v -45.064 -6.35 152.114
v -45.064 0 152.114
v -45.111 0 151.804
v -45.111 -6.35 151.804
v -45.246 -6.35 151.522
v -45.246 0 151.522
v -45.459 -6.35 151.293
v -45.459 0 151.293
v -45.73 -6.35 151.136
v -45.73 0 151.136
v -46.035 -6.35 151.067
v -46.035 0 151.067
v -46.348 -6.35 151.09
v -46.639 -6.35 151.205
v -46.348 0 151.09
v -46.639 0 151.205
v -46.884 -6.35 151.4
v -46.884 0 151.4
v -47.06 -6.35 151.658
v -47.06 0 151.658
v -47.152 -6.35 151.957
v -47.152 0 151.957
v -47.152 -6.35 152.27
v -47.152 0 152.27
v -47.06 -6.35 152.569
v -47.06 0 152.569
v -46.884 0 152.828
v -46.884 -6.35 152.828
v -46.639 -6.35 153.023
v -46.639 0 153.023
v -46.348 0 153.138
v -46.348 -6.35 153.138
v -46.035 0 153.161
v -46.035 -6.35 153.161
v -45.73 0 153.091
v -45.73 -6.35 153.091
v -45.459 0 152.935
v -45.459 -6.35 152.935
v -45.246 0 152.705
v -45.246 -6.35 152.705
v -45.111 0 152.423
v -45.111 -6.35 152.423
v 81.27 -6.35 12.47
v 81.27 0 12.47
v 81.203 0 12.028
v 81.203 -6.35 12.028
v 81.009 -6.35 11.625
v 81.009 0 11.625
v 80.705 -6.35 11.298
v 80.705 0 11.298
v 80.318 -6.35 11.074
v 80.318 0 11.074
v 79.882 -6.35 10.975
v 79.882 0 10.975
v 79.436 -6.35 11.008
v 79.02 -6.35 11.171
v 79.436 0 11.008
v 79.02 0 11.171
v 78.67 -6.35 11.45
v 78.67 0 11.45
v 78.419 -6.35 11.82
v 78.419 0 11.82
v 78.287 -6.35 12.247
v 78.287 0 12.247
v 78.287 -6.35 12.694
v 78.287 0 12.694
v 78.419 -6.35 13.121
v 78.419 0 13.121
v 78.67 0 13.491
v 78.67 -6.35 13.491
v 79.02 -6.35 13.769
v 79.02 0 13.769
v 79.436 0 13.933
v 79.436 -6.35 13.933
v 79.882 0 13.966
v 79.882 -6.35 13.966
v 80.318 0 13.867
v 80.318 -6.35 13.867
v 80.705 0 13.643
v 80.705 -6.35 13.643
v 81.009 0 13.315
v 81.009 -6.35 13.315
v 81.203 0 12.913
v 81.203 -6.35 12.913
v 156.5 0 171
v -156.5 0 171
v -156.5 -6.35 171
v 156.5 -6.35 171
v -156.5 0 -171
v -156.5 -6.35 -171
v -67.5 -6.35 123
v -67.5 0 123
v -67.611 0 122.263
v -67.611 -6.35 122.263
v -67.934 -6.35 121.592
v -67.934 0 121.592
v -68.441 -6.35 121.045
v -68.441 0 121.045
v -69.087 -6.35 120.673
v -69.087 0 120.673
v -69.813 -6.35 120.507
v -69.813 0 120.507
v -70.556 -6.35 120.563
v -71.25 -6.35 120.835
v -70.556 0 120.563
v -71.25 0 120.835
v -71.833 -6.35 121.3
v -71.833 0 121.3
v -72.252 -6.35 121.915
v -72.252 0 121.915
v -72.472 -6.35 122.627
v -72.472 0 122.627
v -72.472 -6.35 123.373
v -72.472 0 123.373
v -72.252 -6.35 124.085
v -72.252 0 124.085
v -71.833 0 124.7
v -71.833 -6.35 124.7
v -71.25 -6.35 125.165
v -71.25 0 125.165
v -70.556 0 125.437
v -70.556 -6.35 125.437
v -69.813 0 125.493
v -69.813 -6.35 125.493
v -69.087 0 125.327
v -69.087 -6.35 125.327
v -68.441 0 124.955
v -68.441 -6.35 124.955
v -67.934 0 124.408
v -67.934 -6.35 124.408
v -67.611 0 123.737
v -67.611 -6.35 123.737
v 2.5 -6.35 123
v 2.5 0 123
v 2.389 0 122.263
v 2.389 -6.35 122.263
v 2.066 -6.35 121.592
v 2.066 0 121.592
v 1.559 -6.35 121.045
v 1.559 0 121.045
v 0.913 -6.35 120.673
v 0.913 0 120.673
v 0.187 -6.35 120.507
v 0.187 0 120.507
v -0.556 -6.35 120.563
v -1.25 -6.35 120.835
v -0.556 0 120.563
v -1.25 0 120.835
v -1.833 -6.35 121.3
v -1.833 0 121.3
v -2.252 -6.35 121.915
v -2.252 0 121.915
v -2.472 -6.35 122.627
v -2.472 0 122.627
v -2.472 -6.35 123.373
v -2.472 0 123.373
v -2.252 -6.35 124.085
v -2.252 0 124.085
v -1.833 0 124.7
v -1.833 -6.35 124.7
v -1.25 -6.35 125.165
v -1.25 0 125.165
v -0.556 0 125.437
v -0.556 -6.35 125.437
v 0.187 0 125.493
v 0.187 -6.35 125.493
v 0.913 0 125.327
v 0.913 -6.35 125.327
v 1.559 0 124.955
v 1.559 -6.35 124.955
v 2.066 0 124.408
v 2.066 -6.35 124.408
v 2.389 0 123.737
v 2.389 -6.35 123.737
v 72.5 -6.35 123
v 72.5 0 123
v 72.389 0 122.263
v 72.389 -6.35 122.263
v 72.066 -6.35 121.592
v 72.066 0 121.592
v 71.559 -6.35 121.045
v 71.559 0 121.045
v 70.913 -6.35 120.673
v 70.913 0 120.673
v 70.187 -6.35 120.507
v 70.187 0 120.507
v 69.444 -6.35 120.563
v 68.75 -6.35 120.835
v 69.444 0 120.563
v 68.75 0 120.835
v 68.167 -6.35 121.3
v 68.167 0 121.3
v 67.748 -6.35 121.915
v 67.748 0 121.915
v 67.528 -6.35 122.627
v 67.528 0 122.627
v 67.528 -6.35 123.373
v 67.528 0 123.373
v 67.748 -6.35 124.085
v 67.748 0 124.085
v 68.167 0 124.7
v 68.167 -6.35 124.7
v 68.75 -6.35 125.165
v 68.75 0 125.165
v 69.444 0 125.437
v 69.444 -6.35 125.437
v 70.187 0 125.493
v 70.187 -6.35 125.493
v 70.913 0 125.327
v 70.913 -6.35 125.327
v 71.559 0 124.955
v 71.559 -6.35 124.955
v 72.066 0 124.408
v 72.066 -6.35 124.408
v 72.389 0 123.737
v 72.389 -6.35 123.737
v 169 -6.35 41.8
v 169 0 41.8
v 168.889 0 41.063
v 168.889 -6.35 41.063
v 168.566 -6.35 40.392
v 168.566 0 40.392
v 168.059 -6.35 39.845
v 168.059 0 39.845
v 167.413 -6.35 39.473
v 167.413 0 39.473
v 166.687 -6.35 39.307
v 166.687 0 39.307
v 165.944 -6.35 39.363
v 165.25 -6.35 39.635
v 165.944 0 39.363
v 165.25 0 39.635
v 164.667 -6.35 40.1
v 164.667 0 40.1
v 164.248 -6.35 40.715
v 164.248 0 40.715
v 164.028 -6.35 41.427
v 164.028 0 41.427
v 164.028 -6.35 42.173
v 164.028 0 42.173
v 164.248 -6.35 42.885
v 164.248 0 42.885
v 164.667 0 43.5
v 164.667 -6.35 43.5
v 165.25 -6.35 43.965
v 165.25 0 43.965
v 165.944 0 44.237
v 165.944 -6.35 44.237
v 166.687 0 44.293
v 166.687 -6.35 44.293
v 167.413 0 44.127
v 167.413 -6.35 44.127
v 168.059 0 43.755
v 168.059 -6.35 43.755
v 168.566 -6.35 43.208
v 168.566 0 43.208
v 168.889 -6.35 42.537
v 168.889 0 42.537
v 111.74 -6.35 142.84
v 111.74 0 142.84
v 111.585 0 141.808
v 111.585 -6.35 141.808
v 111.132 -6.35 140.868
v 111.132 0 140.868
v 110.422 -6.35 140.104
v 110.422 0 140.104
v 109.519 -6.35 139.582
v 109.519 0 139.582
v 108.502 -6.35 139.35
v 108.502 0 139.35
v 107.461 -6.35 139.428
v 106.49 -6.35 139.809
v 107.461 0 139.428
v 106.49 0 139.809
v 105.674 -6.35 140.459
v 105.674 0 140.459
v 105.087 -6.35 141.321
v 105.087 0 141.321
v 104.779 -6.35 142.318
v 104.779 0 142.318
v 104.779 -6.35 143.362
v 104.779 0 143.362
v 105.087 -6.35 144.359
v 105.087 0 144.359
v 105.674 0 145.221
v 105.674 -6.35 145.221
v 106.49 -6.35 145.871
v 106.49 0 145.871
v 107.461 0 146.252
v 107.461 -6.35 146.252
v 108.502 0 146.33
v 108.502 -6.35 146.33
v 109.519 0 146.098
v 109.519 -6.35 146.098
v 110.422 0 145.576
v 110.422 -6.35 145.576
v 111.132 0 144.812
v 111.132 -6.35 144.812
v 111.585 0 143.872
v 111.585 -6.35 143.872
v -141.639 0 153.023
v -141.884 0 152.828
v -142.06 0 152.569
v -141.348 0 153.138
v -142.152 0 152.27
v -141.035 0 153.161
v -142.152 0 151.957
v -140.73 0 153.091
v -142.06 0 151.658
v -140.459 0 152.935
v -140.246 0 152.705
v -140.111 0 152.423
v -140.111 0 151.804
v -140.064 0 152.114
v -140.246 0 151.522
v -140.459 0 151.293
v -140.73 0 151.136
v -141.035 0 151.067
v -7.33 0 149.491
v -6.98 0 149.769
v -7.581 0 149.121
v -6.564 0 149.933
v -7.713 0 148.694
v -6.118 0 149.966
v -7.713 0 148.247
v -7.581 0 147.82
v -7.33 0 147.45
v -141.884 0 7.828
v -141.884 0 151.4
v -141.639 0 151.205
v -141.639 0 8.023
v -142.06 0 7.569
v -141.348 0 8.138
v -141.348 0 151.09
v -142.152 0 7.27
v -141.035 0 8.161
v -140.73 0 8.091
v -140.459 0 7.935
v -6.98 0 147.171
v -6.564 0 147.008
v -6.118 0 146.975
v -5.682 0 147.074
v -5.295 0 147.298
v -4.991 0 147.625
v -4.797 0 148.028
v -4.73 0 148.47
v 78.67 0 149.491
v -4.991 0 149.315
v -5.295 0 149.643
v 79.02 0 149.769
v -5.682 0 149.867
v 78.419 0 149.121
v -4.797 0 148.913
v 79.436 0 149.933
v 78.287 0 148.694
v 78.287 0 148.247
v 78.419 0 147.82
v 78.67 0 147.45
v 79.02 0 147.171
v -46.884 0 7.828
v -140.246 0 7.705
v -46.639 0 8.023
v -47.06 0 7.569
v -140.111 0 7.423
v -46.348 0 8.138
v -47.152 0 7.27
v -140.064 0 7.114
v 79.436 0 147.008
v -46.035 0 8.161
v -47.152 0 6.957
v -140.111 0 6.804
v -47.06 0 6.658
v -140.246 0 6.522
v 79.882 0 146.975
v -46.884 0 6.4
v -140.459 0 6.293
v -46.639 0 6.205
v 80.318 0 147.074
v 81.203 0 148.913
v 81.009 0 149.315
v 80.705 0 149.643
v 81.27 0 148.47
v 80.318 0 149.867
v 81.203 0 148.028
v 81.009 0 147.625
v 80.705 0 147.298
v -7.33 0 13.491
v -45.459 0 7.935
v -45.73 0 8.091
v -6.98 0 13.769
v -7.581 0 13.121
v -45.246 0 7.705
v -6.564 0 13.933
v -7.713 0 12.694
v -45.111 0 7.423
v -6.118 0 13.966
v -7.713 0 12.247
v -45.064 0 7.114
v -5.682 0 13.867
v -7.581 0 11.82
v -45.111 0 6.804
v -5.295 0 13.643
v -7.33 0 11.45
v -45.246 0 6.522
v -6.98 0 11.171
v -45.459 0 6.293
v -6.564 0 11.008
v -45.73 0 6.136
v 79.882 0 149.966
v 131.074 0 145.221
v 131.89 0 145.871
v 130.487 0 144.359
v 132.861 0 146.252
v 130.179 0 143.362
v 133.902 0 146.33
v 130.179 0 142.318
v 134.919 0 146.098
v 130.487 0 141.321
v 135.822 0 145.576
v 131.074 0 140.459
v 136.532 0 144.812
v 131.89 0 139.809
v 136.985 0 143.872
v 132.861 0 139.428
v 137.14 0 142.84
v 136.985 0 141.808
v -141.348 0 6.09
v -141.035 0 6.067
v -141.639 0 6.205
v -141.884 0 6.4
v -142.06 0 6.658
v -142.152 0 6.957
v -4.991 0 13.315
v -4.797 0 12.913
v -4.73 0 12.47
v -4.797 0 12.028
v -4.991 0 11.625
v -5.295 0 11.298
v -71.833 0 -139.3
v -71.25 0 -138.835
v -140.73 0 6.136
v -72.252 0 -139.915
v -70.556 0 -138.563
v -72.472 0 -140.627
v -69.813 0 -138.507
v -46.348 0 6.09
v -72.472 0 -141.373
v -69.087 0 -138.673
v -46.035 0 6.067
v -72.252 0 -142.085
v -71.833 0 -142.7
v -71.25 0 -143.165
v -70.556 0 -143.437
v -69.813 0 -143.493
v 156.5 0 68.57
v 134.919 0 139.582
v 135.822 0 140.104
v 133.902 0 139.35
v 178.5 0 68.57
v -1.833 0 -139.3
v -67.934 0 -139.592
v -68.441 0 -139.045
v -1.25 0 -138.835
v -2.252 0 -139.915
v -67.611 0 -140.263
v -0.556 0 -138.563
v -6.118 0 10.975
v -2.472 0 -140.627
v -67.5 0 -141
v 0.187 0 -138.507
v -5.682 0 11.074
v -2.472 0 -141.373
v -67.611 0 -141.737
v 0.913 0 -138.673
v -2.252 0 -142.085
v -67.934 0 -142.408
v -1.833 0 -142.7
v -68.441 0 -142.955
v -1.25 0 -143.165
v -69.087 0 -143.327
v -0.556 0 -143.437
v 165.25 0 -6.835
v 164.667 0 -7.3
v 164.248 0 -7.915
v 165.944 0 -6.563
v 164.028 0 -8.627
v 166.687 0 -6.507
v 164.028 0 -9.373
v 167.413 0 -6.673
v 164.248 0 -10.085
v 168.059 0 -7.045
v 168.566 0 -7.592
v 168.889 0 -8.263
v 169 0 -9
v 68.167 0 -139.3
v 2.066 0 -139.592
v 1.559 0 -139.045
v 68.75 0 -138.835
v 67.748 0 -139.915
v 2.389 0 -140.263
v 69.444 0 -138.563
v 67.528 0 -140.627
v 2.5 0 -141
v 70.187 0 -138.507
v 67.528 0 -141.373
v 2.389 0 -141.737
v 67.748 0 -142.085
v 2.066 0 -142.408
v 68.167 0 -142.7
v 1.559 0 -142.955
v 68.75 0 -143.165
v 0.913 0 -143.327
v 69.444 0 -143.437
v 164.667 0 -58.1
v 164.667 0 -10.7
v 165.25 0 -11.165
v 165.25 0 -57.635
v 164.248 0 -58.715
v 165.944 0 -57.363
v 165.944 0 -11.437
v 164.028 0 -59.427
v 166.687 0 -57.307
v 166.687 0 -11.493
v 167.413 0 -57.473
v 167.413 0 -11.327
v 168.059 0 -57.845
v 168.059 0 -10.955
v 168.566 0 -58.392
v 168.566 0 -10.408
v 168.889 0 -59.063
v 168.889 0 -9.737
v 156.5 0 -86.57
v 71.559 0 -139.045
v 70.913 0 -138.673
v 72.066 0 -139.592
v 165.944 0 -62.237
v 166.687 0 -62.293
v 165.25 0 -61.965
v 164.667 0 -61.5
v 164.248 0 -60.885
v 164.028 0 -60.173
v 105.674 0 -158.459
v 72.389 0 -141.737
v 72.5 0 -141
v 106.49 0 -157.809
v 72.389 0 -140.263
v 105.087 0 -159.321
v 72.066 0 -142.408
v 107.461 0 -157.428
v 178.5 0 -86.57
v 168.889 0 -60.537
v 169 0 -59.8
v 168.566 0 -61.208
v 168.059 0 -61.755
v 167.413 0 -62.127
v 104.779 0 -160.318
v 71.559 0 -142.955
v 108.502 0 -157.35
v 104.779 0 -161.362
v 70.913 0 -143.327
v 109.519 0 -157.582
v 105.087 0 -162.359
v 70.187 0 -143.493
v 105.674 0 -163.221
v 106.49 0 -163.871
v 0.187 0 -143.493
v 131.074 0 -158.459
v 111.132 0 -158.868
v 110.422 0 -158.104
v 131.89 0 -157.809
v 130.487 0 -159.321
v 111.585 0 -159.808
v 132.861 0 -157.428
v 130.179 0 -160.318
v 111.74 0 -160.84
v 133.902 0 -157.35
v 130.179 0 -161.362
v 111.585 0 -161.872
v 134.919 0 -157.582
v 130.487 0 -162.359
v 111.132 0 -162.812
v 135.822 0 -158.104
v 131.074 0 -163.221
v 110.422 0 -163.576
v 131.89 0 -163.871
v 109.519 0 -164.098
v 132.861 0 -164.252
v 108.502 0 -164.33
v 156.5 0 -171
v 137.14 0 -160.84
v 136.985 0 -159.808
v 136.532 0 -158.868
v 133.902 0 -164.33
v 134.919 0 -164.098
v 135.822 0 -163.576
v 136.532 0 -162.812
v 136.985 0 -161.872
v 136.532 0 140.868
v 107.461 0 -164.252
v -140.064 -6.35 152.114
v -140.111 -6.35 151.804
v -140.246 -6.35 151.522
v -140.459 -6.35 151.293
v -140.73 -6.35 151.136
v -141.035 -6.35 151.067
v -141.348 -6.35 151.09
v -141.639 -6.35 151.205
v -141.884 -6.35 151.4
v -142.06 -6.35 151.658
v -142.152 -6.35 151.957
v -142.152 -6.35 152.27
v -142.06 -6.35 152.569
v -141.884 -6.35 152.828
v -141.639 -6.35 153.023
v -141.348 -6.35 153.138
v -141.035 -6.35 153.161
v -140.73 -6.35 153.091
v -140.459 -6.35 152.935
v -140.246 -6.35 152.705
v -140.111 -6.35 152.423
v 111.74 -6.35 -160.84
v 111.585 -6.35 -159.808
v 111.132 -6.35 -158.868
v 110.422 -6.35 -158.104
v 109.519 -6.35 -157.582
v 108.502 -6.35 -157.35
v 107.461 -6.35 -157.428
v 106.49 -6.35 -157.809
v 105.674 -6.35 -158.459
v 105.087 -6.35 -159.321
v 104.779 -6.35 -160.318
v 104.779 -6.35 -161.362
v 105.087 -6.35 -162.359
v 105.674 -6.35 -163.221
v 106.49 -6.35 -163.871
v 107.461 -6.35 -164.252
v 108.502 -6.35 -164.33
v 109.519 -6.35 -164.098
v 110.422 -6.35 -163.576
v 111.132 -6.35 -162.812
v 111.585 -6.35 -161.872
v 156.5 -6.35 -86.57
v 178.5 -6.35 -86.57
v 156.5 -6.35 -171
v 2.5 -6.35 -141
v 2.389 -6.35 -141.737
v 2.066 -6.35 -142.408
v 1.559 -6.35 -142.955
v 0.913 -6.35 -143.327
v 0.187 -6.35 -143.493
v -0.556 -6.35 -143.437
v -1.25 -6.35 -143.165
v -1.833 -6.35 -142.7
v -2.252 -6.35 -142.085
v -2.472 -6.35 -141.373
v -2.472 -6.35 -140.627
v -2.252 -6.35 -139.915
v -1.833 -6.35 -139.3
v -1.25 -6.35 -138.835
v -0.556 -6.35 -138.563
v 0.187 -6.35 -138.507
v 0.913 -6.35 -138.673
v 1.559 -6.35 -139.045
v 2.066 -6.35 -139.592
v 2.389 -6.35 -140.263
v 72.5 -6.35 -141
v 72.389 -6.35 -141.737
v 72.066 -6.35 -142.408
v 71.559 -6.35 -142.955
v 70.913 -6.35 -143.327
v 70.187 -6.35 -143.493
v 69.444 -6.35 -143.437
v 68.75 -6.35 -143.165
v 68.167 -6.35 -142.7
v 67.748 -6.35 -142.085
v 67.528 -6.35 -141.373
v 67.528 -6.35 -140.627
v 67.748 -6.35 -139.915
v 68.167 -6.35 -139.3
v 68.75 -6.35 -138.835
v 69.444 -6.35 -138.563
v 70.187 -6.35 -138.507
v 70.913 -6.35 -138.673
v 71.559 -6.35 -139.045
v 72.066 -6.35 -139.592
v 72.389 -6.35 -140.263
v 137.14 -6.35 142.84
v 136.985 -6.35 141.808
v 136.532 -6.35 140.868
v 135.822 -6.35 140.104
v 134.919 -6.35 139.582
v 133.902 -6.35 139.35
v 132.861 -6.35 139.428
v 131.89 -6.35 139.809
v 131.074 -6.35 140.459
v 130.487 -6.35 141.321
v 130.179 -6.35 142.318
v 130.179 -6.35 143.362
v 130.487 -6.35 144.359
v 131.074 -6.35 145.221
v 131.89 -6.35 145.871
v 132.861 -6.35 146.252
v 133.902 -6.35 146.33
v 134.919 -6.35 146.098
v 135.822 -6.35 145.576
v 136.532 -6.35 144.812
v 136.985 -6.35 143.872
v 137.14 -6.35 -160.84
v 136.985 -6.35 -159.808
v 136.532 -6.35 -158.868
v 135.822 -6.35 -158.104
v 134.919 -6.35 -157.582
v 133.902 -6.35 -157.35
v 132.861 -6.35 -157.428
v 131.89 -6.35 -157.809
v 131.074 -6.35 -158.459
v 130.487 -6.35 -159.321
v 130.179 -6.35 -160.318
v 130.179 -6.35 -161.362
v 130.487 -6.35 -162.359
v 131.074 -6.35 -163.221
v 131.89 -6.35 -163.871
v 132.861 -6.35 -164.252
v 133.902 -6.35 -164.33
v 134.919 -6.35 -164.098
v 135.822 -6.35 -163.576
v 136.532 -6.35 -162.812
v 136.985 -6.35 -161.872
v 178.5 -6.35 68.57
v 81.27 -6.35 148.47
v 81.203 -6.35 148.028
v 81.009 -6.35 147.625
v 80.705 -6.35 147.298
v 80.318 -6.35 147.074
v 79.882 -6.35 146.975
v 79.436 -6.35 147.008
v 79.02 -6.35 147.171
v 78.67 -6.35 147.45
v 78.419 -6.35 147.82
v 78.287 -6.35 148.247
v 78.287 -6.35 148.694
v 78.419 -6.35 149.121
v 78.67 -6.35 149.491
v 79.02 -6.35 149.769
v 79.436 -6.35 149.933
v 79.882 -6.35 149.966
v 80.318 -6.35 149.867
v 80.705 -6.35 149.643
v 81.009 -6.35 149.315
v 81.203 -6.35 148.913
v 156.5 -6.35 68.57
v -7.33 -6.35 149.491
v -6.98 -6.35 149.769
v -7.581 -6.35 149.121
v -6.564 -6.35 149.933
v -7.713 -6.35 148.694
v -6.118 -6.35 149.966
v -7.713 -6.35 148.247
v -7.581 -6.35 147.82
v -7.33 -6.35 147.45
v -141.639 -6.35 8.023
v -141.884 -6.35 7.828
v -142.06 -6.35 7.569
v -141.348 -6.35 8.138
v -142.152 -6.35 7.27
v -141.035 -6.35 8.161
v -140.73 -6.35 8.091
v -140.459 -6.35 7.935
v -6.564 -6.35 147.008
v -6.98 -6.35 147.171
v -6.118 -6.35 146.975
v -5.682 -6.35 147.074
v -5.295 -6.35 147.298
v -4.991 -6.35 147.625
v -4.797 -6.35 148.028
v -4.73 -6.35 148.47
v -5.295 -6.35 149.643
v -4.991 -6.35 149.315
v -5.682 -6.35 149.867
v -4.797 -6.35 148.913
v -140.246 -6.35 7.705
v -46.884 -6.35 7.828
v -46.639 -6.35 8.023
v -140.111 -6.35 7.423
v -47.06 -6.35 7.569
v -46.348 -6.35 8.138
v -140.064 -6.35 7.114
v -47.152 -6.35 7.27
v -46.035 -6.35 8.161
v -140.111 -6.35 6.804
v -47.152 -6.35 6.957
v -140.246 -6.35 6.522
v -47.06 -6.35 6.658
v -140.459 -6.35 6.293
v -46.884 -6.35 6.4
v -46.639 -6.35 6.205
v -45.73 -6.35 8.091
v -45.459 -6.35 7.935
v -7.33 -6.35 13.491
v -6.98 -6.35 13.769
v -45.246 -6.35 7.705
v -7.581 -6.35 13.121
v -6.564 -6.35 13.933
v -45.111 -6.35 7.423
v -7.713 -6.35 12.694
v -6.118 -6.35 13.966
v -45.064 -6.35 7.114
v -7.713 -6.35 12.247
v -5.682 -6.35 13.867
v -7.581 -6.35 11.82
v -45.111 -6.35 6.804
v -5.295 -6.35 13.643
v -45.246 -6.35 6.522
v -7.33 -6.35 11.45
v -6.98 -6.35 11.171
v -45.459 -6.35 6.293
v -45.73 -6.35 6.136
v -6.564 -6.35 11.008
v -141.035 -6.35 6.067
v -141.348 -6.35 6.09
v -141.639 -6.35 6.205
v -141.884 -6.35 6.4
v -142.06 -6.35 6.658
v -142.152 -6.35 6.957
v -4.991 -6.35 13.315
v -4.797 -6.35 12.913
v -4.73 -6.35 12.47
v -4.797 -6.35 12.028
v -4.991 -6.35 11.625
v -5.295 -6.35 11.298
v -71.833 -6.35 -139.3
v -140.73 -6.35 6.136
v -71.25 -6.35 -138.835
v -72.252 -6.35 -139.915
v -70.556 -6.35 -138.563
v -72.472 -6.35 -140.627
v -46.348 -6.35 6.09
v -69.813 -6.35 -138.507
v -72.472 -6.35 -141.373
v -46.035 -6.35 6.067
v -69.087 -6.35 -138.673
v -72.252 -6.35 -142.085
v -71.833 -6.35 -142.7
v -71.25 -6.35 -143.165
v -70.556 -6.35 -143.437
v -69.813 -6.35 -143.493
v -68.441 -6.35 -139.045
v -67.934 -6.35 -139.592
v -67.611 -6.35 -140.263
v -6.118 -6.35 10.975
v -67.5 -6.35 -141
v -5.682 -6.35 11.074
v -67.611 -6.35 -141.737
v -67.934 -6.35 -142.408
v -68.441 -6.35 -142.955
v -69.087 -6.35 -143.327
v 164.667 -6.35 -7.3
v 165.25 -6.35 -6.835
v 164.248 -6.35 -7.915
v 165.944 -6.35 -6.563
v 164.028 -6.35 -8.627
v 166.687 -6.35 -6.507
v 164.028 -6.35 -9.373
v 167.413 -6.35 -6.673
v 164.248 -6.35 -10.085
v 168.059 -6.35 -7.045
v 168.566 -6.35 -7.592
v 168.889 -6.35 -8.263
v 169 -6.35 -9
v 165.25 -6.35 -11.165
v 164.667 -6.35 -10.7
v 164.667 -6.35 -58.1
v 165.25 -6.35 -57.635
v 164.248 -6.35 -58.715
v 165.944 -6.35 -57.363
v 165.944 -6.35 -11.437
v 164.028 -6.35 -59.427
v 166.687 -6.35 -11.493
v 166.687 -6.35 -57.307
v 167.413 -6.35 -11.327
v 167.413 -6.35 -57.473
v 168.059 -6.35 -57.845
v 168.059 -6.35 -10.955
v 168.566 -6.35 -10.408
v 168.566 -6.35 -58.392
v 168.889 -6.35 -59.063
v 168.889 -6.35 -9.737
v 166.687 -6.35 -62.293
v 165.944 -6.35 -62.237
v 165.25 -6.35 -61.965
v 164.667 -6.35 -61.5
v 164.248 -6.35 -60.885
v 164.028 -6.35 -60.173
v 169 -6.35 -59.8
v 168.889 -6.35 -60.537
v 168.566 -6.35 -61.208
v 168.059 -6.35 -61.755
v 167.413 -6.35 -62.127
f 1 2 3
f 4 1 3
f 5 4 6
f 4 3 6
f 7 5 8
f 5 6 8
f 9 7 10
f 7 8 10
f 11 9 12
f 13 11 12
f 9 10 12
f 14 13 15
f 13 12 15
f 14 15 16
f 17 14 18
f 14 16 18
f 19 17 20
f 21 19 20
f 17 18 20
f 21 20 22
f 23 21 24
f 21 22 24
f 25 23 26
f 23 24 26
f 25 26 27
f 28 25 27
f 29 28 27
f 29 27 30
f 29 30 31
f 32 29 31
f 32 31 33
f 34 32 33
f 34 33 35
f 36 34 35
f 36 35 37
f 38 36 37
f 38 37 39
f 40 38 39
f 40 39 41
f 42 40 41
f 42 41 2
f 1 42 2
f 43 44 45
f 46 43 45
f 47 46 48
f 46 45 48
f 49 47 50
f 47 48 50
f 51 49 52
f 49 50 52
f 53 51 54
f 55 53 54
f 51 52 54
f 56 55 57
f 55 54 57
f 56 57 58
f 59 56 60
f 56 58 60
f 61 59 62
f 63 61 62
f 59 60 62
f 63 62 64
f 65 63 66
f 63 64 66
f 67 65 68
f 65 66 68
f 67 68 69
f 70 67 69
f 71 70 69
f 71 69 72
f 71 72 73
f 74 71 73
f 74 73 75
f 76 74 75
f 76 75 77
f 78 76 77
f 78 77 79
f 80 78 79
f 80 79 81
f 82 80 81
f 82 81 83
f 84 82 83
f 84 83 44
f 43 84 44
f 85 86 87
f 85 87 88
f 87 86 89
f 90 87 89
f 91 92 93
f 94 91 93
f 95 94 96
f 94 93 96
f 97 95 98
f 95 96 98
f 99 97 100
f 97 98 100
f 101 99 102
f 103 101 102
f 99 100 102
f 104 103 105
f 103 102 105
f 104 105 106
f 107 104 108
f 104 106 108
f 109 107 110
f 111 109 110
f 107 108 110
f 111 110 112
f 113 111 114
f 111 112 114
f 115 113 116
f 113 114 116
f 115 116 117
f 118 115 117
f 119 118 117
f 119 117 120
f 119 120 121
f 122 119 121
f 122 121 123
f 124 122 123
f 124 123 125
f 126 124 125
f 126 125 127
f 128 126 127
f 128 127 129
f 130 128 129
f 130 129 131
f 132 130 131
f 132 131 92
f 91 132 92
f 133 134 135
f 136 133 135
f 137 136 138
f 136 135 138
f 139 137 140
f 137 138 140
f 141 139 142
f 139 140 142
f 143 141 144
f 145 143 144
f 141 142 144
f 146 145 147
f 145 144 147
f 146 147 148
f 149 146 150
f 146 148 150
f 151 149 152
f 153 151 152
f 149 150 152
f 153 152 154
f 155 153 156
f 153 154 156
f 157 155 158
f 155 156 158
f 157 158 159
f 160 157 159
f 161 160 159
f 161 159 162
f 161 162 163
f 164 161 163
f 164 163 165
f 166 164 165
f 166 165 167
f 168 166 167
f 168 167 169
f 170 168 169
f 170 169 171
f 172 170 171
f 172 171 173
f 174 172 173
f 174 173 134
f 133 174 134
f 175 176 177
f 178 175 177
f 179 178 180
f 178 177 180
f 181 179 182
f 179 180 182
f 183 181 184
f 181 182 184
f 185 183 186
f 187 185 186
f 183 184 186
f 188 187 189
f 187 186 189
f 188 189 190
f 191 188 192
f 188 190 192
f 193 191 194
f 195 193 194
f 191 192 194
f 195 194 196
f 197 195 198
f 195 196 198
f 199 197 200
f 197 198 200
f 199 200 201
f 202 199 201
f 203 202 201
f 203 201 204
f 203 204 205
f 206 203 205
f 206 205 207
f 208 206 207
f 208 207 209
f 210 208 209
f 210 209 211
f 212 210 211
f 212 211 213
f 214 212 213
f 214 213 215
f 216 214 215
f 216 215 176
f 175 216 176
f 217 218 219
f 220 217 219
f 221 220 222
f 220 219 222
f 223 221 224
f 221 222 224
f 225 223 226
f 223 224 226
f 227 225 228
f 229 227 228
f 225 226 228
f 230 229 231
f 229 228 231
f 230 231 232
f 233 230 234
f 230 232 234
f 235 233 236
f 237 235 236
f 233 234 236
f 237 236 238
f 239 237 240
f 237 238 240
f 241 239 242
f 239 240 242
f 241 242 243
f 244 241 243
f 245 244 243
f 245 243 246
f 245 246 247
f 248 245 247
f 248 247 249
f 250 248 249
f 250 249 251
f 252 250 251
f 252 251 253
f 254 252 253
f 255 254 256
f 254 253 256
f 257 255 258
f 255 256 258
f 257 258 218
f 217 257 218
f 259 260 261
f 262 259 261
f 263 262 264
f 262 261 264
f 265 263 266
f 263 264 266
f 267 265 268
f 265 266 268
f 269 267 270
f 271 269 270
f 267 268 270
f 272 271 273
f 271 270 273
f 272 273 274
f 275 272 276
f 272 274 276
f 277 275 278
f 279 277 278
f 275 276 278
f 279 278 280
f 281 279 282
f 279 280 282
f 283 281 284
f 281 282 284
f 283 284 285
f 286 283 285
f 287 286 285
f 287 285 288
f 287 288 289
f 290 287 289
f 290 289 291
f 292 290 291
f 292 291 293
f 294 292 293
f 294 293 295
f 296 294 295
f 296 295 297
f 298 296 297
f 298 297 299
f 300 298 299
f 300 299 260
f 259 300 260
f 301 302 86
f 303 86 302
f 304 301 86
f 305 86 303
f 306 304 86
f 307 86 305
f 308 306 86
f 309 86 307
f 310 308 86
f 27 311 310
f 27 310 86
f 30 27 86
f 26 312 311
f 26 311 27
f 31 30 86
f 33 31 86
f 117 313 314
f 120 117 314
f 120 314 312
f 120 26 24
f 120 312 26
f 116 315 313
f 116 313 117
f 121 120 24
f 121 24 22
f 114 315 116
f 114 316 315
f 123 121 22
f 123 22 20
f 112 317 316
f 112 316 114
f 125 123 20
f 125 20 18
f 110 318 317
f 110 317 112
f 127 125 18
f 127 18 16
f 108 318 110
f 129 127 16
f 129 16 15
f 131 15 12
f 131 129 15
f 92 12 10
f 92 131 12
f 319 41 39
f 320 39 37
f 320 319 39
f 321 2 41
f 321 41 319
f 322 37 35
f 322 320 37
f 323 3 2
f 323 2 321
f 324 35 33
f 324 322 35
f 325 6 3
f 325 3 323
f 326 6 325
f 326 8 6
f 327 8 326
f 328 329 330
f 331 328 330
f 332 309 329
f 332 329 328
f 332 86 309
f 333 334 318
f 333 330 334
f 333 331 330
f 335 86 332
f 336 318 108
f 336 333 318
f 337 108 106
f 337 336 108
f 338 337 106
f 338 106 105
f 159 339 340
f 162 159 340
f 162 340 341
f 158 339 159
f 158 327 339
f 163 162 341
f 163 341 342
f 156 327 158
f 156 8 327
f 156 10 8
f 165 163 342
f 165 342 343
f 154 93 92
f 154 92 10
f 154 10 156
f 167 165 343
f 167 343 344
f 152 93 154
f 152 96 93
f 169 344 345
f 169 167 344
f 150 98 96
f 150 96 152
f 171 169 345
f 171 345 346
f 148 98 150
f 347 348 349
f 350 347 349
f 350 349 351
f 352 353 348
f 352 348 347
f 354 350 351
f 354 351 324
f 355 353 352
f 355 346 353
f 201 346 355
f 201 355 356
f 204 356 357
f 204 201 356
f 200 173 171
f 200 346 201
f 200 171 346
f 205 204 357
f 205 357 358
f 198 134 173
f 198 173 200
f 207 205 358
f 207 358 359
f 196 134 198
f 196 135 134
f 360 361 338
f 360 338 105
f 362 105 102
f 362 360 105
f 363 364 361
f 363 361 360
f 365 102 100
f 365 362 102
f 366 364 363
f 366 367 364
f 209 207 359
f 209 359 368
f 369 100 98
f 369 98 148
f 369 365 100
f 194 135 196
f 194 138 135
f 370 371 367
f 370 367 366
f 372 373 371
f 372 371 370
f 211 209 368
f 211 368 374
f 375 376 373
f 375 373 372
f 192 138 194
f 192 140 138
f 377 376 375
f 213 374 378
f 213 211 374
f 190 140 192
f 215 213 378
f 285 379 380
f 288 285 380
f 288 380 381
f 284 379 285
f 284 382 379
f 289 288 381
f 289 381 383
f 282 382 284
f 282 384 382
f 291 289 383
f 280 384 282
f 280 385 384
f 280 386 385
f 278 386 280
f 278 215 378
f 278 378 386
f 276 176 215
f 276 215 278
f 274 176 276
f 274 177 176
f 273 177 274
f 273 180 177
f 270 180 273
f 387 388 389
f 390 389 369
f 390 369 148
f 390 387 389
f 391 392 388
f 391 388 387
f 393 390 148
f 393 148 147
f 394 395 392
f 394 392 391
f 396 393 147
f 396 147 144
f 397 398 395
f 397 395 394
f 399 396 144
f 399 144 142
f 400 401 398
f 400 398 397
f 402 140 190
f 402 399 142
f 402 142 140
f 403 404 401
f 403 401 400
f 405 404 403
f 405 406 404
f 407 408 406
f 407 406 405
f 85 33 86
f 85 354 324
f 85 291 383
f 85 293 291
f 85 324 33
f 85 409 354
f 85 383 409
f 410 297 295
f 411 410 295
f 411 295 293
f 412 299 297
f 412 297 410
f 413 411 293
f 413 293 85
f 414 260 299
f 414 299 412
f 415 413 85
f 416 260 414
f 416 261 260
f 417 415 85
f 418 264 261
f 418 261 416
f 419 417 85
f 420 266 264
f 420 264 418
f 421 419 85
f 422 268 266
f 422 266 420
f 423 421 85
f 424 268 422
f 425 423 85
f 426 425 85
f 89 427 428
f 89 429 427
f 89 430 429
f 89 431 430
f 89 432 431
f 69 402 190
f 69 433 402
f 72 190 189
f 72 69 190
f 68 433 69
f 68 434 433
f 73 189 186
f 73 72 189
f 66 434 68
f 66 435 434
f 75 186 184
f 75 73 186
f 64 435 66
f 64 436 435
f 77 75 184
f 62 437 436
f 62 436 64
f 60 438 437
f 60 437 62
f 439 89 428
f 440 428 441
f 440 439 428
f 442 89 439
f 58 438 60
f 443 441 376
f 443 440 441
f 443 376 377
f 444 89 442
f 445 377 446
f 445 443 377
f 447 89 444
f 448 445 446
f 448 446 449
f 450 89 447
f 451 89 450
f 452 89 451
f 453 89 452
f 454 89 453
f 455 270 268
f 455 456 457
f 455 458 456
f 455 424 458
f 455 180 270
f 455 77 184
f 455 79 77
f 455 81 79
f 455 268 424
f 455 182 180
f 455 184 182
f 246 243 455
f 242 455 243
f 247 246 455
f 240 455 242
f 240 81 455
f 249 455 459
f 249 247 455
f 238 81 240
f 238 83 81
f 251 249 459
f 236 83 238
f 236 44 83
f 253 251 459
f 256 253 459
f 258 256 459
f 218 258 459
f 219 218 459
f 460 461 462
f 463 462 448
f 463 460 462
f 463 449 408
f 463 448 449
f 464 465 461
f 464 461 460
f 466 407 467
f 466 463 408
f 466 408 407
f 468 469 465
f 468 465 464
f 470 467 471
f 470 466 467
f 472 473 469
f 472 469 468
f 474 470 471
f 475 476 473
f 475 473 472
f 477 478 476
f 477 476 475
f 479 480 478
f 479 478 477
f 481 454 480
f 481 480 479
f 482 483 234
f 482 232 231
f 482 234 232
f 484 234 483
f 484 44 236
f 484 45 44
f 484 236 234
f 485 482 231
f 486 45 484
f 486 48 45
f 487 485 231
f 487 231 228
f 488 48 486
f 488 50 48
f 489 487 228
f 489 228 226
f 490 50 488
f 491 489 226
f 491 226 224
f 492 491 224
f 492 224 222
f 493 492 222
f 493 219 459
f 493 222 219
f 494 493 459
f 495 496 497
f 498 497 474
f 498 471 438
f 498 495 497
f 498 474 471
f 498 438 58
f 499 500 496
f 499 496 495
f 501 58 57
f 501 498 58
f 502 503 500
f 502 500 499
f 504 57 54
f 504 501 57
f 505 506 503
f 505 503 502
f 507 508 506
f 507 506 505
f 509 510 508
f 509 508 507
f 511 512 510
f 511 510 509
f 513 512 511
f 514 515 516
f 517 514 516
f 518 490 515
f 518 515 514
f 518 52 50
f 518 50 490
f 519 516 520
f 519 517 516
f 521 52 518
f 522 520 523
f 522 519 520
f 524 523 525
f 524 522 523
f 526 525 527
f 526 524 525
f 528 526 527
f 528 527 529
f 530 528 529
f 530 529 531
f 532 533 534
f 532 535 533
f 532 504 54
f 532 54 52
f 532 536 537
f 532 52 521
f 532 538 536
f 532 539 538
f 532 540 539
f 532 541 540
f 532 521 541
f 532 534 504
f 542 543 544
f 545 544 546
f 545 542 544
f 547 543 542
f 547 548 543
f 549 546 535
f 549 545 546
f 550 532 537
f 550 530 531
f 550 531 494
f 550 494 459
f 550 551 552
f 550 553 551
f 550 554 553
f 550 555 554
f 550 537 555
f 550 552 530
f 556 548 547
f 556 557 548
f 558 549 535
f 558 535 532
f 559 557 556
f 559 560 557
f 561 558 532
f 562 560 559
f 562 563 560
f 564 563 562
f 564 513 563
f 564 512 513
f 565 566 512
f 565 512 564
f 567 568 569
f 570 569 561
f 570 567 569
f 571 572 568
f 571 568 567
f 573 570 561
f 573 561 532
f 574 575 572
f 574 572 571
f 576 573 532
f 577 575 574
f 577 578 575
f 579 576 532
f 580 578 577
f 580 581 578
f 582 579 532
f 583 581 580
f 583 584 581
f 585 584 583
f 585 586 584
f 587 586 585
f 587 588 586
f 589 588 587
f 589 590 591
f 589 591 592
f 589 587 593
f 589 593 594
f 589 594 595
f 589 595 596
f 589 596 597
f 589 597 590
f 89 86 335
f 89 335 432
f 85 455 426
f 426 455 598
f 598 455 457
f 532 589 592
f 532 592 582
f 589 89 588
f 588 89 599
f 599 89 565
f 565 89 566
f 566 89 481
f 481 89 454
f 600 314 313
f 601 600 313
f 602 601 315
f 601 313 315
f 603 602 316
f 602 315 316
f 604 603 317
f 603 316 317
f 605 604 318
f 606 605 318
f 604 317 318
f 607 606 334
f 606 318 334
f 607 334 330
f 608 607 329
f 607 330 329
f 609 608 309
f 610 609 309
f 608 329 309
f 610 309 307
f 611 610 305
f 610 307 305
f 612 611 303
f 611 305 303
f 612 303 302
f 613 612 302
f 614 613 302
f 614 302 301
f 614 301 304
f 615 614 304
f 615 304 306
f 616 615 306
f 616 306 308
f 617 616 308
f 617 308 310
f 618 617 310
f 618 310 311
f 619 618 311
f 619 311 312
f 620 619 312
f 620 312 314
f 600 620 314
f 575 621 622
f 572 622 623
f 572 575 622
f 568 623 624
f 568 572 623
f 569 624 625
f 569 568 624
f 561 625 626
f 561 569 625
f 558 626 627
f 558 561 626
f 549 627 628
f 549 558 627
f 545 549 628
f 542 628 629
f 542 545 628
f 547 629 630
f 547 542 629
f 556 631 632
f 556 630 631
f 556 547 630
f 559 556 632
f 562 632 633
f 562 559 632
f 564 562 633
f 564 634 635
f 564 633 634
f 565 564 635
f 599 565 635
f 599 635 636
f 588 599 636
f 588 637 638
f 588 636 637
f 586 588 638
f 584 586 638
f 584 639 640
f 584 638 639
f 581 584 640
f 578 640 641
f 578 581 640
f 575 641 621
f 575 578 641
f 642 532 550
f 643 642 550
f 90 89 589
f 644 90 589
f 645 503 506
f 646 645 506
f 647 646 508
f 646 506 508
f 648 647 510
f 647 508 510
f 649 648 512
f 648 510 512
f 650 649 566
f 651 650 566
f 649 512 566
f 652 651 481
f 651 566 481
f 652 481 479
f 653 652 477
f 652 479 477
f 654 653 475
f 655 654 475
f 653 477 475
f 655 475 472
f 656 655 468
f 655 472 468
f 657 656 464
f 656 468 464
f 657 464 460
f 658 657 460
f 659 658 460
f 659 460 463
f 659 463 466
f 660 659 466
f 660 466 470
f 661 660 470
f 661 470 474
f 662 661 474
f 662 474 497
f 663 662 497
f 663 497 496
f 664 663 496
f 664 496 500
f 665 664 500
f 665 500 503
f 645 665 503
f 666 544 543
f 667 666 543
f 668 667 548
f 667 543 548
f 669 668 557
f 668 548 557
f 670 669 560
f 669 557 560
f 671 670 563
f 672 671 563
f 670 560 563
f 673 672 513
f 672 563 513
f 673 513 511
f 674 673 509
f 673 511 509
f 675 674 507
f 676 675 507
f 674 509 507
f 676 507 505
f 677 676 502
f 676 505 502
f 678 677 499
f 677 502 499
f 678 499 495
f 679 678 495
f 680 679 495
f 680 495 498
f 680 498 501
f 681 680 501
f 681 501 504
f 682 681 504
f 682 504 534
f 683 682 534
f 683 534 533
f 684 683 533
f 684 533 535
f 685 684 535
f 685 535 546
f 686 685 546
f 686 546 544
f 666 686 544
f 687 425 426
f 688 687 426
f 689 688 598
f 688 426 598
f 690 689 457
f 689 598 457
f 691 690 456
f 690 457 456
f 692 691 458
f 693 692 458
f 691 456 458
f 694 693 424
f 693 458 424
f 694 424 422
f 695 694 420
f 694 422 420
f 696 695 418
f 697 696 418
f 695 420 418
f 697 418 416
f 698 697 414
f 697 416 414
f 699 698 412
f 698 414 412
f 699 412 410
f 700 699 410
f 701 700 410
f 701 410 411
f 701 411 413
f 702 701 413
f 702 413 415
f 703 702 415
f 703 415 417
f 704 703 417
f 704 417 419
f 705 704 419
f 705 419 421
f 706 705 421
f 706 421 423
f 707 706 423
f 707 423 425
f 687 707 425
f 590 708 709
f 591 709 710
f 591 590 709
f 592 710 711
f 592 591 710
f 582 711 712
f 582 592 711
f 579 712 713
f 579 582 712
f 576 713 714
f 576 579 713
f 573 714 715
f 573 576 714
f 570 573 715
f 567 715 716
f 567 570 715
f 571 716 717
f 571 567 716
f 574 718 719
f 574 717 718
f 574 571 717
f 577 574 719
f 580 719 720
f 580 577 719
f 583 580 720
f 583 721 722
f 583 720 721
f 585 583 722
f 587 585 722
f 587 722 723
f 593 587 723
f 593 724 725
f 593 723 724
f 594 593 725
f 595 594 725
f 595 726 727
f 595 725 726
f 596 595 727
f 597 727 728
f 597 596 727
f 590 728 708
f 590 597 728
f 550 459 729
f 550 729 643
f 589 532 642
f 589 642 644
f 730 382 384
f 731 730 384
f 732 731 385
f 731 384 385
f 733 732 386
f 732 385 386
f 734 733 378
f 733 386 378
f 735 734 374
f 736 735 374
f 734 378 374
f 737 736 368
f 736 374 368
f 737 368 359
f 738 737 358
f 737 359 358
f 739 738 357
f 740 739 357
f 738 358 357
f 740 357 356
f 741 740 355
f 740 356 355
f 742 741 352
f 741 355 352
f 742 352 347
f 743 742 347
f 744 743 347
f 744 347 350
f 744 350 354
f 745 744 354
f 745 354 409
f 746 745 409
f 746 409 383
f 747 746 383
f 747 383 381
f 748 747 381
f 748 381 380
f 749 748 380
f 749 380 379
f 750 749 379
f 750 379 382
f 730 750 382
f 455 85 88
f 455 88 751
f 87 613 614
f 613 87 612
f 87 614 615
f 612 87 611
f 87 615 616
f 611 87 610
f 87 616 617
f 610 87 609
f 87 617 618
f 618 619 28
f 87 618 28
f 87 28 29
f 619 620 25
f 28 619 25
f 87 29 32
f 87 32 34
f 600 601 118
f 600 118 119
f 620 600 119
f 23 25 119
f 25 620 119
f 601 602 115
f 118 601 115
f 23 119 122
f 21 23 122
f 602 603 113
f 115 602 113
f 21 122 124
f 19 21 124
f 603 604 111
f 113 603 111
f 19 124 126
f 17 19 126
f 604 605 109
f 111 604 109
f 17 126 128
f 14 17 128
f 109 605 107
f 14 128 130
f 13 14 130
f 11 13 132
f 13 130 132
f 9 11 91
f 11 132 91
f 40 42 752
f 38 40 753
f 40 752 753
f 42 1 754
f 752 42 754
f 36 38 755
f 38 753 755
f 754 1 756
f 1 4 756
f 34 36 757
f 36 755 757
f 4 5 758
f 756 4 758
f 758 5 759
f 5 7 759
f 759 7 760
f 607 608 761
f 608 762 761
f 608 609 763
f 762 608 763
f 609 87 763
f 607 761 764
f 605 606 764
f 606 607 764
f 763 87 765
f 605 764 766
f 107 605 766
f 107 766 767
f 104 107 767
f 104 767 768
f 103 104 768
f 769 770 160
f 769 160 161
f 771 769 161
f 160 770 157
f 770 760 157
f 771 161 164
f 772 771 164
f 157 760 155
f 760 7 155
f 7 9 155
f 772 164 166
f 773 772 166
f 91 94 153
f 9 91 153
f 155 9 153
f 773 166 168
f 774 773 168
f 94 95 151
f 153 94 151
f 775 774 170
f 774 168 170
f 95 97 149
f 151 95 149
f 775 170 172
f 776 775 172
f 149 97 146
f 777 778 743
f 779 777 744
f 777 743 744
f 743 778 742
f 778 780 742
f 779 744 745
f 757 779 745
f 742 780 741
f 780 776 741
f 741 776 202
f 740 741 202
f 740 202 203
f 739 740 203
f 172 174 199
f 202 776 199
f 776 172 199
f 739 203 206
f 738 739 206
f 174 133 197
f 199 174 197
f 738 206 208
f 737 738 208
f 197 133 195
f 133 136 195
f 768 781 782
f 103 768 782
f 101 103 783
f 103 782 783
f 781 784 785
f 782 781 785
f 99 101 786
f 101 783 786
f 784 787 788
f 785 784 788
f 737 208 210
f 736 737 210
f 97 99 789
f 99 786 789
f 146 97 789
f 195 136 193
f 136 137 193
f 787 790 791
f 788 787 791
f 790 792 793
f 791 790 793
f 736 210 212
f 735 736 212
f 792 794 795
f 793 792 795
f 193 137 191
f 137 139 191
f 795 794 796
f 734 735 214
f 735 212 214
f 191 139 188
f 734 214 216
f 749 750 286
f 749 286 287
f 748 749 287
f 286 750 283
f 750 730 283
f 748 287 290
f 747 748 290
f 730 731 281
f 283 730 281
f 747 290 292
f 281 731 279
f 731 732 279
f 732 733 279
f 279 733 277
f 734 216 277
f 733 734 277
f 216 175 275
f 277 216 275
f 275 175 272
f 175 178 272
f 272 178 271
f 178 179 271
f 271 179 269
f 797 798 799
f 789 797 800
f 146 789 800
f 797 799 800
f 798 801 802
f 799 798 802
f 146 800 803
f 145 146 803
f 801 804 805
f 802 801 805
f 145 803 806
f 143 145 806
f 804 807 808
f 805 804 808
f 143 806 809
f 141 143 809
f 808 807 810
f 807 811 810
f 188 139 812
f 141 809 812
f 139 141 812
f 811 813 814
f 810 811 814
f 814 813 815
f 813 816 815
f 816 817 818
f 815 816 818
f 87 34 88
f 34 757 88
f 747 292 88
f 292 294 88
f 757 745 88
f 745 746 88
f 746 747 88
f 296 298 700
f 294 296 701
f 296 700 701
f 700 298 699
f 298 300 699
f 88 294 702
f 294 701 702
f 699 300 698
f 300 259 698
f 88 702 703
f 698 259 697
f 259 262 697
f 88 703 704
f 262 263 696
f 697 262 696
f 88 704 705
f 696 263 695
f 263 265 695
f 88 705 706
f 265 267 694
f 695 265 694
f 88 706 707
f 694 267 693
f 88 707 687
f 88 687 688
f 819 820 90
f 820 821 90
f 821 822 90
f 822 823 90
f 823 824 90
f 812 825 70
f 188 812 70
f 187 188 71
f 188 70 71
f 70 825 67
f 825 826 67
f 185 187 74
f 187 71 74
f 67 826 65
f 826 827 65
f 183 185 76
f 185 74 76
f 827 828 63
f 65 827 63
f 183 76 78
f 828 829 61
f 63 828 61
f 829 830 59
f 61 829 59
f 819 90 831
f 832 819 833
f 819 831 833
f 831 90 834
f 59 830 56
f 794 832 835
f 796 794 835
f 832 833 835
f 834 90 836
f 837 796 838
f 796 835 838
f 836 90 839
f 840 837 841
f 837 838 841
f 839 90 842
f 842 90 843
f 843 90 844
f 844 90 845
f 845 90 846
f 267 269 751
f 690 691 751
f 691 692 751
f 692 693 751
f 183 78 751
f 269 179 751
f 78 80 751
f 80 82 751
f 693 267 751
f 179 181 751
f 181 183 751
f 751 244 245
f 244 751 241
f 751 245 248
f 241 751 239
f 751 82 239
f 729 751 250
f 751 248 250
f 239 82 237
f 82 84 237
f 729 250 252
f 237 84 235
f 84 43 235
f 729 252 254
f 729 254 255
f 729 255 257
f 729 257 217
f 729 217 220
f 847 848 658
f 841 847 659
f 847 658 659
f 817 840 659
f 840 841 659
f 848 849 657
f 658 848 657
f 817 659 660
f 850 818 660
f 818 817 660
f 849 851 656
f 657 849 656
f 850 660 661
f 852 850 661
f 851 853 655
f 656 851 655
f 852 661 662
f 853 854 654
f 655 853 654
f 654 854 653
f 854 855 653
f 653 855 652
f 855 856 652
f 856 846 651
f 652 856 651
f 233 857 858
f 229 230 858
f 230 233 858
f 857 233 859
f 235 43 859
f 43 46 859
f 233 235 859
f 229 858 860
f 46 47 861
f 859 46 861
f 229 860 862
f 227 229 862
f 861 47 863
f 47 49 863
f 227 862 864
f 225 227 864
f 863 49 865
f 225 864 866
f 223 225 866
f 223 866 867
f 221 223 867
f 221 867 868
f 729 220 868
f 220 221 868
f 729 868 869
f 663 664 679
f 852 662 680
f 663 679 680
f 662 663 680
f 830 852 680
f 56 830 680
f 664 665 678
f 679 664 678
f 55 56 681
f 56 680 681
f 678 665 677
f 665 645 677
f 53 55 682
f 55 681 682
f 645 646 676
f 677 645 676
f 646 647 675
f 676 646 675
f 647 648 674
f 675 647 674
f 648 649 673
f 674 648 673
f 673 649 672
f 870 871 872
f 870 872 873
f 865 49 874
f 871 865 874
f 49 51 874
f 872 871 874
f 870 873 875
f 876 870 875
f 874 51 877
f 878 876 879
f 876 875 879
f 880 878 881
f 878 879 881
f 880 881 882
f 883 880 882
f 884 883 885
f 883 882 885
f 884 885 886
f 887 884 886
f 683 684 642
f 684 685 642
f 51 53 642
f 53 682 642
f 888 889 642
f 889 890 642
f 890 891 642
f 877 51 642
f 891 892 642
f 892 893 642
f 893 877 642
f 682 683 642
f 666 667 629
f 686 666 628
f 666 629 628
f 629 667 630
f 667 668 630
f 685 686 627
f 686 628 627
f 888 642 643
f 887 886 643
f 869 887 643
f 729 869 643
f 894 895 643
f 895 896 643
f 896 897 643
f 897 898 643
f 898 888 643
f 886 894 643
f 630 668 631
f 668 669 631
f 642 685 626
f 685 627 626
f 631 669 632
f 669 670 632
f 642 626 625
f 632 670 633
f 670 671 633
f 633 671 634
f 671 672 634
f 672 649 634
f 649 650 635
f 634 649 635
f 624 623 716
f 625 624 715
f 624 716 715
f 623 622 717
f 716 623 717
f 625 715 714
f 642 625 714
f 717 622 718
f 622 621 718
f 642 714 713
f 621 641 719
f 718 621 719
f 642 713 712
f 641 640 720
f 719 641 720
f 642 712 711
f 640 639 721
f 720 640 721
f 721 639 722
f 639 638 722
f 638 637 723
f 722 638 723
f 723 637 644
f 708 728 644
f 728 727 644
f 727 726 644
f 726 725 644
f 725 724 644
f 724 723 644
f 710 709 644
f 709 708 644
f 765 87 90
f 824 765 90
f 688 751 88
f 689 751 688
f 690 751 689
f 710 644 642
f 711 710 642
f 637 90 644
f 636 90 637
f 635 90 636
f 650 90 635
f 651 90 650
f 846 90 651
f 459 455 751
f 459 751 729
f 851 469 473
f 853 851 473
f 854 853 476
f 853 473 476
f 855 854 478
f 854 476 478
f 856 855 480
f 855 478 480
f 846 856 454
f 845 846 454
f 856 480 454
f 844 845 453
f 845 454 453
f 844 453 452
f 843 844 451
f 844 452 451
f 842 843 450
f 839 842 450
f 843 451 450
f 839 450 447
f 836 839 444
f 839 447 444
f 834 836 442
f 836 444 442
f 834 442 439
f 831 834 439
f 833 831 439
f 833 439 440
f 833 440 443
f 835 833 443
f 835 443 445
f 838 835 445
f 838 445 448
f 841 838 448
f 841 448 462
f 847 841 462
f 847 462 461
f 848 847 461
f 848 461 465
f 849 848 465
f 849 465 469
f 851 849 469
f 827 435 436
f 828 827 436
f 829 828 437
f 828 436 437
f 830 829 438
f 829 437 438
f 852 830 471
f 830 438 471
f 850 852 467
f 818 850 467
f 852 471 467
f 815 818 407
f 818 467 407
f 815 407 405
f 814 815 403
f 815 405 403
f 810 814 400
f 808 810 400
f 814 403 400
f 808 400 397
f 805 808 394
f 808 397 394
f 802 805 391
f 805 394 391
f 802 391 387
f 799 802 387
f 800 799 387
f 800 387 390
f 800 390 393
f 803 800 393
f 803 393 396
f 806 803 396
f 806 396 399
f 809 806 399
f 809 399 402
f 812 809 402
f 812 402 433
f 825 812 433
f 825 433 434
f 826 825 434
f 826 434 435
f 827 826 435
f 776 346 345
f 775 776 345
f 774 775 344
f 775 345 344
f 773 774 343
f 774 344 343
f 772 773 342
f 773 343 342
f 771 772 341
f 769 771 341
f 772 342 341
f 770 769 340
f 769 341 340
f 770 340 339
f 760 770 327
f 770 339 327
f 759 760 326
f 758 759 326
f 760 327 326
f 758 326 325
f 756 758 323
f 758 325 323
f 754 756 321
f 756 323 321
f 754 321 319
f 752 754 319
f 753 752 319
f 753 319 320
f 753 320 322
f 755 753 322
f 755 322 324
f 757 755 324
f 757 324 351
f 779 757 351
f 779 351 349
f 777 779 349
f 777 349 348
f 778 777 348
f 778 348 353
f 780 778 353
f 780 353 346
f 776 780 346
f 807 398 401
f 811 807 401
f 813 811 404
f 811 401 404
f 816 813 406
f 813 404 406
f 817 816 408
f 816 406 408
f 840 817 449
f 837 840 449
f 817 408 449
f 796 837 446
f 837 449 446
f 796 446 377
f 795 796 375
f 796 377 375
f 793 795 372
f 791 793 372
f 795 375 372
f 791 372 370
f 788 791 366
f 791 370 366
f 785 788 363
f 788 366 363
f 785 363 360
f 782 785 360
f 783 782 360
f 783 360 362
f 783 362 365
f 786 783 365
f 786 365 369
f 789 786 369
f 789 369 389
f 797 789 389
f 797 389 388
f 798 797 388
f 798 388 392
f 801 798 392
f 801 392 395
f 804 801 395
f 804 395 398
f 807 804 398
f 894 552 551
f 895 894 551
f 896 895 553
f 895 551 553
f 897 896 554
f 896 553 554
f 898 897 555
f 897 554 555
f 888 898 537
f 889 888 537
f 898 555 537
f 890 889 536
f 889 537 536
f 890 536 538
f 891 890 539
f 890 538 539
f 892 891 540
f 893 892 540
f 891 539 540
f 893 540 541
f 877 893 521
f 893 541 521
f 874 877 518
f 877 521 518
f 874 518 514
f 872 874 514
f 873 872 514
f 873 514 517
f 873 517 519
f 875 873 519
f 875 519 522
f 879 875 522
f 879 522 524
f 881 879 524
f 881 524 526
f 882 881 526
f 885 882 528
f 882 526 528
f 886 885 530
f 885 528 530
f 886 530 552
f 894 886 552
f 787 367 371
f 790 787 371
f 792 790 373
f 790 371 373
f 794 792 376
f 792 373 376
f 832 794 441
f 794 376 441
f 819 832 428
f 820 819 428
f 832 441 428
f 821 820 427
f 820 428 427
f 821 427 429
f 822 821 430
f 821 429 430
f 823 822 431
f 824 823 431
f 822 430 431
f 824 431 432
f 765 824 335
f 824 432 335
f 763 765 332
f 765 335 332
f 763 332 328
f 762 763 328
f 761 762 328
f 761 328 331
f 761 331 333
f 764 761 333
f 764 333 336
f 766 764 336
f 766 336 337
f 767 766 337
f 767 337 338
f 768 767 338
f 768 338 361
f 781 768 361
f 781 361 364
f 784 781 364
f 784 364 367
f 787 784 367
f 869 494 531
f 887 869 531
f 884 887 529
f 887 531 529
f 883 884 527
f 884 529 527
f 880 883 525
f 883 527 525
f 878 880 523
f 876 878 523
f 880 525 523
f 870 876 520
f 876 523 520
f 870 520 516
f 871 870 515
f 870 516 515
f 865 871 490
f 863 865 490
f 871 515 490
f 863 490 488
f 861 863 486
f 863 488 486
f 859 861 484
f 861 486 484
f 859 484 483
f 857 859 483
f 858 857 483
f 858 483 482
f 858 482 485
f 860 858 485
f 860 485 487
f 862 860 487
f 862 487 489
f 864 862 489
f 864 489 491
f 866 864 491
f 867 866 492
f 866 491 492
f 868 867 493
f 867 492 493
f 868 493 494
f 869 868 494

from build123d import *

# Parameters (mm, degrees)
SKETCH1_W           = 313
SKETCH1_H           = 342
BOSS_EXTRUDE1_DEPTH = 6.35
SKETCH3_W           = 22
SKETCH3_H           = 155.14040353
SKETCH3_R           = 2.5
BOSS_EXTRUDE2_DEPTH = 6.35
SKETCH2_R           = 2.5
CUT_EXTRUDE1_DEPTH  = 7.35
SKETCH4_R           = 3.5
CUT_EXTRUDE2_DEPTH  = 7.35
SKETCH5_R           = 1.5
SKETCH5_R_2         = 1.05
CUT_EXTRUDE3_DEPTH  = 7.35


with BuildPart() as part:
    # Sketch1 → Boss-Extrude1 (new body)
    with BuildSketch(Plane(origin=(0, 0, 0), x_dir=(1, 0, 0), z_dir=(0, 1, 0))):
        Rectangle(SKETCH1_W, SKETCH1_H)
    extrude(amount=-BOSS_EXTRUDE1_DEPTH)

    # Sketch3 → Boss-Extrude2 (add)
    with BuildSketch(Plane(origin=(0, 0, 0), x_dir=(1, 0, 0), z_dir=(0, 1, 0))):
        with Locations((167.5, 9)):
            Rectangle(SKETCH3_W, SKETCH3_H)
        with Locations((166.5, 9)):
            Circle(SKETCH3_R, mode=Mode.SUBTRACT)
        with Locations((166.5, -41.8)):
            Circle(SKETCH3_R, mode=Mode.SUBTRACT)
        with Locations((166.5, 59.8)):
            Circle(SKETCH3_R, mode=Mode.SUBTRACT)
    extrude(amount=-BOSS_EXTRUDE2_DEPTH)

    # Sketch2 → Cut-Extrude1 (cut, through all)
    with BuildSketch(Plane(origin=(0, 0, 0), x_dir=(1, 0, 0), z_dir=(0, 1, 0))):
        with Locations((0, -123)):
            Circle(SKETCH2_R)
        with Locations((-70, -123)):
            Circle(SKETCH2_R)
        with Locations((70, -123)):
            Circle(SKETCH2_R)
        with Locations((-70, 141)):
            Circle(SKETCH2_R)
        with Locations((0, 141)):
            Circle(SKETCH2_R)
        with Locations((70, 141)):
            Circle(SKETCH2_R)
    extrude(amount=-CUT_EXTRUDE1_DEPTH, mode=Mode.SUBTRACT)

    # Sketch4 → Cut-Extrude2 (cut, through all)
    with BuildSketch(Plane(origin=(0, 0, 0), x_dir=(1, 0, 0), z_dir=(0, 1, 0))):
        with Locations((133.64, -142.84)):
            Circle(SKETCH4_R)
        with Locations((108.24, -142.84)):
            Circle(SKETCH4_R)
    cut_extrude2 = extrude(amount=-CUT_EXTRUDE2_DEPTH, mode=Mode.SUBTRACT)

    # Mirror1: Cut-Extrude2 across plane
    add(cut_extrude2.mirror(Plane(origin=(0, 0, -9), x_dir=(1, 0, 0), z_dir=(0, 0, -1))), mode=Mode.SUBTRACT)

    # Sketch5 → Cut-Extrude3 (cut, through all)
    with BuildSketch(Plane(origin=(0, 0, 0), x_dir=(1, 0, 0), z_dir=(0, 1, 0))):
        with Locations((79.770037453, -148.470411985)):
            Circle(SKETCH5_R)
        with Locations((-6.229962547, -148.470411985)):
            Circle(SKETCH5_R)
        with Locations((-6.229962547, -12.470411985)):
            Circle(SKETCH5_R)
        with Locations((79.770037453, -12.470411985)):
            Circle(SKETCH5_R)
        with Locations((-46.113857678, -7.113857678)):
            Circle(SKETCH5_R_2)
        with Locations((-46.113857678, -152.113857678)):
            Circle(SKETCH5_R_2)
        with Locations((-141.113857678, -7.113857678)):
            Circle(SKETCH5_R_2)
        with Locations((-141.113857678, -152.113857678)):
            Circle(SKETCH5_R_2)
    extrude(amount=-CUT_EXTRUDE3_DEPTH, mode=Mode.SUBTRACT)


solid = part.part
